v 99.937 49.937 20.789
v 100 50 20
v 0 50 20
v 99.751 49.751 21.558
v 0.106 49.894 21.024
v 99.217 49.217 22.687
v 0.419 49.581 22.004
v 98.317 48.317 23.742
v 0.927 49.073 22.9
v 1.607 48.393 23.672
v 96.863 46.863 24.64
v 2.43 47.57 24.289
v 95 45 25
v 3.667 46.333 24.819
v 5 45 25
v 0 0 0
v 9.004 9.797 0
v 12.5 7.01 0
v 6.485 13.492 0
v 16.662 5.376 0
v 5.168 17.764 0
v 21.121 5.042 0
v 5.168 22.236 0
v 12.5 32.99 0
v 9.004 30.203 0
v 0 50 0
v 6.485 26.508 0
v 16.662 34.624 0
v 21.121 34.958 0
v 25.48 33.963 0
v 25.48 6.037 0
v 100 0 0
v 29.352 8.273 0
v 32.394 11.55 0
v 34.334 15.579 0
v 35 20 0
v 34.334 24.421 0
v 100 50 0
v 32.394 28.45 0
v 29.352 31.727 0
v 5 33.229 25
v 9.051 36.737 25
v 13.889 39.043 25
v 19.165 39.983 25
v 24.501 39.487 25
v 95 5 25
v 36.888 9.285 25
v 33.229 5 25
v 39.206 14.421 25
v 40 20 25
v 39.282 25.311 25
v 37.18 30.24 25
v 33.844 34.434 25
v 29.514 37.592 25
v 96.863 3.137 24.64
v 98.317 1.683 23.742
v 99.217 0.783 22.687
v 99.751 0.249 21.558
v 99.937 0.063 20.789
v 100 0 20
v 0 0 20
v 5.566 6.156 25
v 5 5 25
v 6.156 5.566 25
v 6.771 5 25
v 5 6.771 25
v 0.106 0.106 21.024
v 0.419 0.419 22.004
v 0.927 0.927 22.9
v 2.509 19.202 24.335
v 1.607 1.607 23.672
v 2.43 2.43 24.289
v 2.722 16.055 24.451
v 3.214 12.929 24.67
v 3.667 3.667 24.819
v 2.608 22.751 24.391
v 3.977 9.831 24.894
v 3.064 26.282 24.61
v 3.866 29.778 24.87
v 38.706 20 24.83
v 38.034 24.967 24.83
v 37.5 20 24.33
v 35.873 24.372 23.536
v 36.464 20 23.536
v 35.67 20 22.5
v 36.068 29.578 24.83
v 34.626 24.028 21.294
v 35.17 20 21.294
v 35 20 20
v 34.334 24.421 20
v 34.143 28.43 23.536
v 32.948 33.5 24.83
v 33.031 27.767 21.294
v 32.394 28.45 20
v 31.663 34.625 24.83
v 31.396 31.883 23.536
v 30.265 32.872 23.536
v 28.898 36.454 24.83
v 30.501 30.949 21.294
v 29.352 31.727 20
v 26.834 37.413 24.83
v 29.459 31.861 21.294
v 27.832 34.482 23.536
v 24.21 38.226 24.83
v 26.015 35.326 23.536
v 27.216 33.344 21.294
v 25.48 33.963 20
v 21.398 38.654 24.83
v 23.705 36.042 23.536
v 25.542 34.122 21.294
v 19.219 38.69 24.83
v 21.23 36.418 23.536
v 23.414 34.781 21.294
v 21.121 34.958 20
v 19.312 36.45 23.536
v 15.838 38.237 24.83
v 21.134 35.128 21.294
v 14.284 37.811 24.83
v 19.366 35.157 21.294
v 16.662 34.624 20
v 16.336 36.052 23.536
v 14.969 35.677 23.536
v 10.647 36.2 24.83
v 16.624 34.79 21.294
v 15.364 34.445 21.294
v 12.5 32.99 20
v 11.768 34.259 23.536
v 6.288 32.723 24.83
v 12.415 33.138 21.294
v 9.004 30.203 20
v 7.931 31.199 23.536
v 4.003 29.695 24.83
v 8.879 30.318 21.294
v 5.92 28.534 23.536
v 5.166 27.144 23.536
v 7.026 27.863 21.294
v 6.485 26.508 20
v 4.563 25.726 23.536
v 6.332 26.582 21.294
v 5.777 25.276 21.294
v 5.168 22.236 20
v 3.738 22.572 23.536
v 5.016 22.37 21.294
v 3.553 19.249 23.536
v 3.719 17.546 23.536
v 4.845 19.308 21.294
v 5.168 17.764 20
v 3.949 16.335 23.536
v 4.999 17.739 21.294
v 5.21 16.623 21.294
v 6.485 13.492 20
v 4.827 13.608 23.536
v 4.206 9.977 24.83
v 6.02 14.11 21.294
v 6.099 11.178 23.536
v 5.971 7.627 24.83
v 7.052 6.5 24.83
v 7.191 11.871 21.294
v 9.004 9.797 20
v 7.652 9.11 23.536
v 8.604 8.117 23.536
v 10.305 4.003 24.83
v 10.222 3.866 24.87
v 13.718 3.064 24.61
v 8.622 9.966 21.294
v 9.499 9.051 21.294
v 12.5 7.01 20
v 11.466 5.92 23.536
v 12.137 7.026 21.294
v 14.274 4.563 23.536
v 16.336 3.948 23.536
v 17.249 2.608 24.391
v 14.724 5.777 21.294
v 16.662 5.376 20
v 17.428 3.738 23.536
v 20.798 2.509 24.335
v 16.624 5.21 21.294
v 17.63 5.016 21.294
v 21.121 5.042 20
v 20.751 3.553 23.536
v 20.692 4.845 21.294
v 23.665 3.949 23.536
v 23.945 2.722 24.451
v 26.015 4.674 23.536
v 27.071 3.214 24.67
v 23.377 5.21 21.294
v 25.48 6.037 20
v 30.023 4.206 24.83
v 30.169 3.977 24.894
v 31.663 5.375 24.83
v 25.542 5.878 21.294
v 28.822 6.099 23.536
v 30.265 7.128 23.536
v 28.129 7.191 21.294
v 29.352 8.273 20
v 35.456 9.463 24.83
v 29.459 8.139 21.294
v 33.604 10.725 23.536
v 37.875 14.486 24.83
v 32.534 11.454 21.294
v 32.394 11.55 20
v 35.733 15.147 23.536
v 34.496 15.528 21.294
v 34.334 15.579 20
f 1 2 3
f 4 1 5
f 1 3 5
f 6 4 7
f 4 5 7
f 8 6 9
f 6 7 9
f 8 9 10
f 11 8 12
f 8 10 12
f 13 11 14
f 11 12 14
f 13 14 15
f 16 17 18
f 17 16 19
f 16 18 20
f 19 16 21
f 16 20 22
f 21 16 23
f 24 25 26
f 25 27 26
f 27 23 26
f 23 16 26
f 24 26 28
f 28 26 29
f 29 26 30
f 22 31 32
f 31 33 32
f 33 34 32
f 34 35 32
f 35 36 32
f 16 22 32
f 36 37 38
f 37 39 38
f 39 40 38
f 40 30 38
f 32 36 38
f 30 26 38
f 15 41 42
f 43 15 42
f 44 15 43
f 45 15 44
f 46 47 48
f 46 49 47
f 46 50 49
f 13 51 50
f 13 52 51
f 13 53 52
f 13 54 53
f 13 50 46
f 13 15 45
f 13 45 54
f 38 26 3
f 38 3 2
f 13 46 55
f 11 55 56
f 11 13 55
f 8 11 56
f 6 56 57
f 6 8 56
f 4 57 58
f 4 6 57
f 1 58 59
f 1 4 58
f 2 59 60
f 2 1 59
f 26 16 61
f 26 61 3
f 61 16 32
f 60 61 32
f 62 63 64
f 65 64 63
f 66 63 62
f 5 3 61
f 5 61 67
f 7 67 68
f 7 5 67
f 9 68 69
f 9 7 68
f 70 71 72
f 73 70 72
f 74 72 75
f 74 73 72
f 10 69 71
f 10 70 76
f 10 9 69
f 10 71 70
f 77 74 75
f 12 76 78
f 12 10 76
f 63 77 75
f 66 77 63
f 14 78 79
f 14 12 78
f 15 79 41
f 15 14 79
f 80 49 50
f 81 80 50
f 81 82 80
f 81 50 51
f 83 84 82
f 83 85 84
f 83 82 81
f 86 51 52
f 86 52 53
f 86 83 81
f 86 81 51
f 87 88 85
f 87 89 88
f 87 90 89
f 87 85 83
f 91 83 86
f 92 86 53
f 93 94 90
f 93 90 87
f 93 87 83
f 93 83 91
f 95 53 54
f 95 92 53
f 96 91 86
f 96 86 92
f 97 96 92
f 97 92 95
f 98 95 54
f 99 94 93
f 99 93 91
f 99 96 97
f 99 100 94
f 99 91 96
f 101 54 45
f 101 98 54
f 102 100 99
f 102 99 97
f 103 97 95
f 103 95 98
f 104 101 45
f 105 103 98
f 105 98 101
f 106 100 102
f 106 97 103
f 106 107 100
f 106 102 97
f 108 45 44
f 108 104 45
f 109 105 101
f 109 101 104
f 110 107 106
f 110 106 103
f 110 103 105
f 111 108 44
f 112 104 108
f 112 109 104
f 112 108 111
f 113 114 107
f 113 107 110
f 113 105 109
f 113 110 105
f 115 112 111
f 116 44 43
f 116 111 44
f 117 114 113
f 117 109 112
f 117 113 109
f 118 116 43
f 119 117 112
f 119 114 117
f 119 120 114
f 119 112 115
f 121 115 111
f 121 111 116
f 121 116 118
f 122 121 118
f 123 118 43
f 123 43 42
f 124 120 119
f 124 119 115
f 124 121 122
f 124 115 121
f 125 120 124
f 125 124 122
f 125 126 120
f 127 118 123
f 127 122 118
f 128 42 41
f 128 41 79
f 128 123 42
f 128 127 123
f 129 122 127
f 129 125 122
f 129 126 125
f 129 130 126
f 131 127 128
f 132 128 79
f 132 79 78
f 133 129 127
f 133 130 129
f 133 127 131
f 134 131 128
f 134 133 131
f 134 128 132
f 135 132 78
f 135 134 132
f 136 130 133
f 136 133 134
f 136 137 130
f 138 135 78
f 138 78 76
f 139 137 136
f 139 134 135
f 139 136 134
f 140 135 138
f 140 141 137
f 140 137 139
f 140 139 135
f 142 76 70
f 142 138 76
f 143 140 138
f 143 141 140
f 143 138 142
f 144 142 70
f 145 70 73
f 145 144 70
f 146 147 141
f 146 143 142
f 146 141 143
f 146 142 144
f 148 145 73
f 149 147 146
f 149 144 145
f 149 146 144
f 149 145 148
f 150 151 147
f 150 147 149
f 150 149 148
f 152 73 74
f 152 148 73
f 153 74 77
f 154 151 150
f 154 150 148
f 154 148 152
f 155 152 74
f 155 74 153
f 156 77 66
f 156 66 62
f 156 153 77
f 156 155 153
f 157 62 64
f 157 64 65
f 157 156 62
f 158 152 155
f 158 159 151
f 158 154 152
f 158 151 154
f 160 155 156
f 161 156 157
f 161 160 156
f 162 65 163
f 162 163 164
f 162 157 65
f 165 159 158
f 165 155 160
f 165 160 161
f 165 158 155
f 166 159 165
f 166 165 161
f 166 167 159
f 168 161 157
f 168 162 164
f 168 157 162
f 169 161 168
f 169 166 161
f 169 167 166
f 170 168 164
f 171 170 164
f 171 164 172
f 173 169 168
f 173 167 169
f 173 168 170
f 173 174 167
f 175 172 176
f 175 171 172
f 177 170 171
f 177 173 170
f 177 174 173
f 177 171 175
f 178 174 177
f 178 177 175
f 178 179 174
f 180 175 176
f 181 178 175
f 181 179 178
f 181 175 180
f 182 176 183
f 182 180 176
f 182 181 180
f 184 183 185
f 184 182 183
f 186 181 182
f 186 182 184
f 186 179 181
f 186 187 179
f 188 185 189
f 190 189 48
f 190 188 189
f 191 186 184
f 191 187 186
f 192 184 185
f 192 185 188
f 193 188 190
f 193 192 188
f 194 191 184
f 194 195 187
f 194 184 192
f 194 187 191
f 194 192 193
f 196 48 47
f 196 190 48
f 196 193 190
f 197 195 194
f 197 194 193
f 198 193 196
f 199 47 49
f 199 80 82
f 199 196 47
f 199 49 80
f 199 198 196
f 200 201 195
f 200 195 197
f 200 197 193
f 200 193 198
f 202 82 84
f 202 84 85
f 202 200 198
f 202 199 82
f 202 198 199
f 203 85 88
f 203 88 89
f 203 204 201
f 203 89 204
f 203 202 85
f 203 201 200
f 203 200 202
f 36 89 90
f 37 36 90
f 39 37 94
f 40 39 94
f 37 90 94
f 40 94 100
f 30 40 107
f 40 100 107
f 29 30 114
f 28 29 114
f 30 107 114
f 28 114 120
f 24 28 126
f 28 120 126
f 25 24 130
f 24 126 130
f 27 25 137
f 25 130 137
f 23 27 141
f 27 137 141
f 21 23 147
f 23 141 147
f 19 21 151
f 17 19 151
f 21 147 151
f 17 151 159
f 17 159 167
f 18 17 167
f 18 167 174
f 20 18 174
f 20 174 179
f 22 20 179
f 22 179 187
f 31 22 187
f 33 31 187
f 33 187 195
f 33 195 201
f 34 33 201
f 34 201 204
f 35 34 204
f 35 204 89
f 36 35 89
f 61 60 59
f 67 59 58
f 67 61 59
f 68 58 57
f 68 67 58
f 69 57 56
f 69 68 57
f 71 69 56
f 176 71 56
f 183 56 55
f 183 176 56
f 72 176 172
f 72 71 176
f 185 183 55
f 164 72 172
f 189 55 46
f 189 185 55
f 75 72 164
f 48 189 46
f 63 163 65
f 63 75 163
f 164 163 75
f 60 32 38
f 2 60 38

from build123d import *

# Parameters (mm, degrees)
F0_W        = 100
F0_H        = 50
F1_DEPTH    = 25
F2_R        = 15
F3_DEPTH    = 25.001
F4_T1_DEPTH = 75
F4_T3_DEPTH = 125


# Not quite as in the source:
# - a fillet or chamfer that OpenCascade refuses, or shapes differently, is made with other operations: its cross-section is extruded or revolved along the edge and cut away or added


with BuildPart() as f1:
    # F0 (on Top) → F1 (new body)
    with BuildSketch(Plane.XY):
        with Locations((50, 25)):
            Rectangle(F0_W, F0_H)
    extrude(amount=F1_DEPTH)

    # F2 (on face) → F3 (cut, through all)
    with BuildSketch(Plane.XY.offset(25)):
        with Locations((20, 20)):
            Circle(F2_R)
    extrude(amount=-F3_DEPTH, mode=Mode.SUBTRACT)

    # F4: fillet of radius 5 on 5 edges, made by hand

    # F4_s2 → F4_t1 (cut)
    with BuildSketch(Plane.XZ.offset(-62.5)):
        with BuildLine():
            ThreePointArc((0, 20), (1.4644660941, 23.5355339059), (5, 25))
            Line((5, 25), (0, 25))
            Line((0, 25), (0, 20))
        make_face()
        with BuildLine():
            ThreePointArc((95, 25), (98.5355339059, 23.5355339059), (100, 20))
            Line((100, 20), (100, 25))
            Line((100, 25), (95, 25))
        make_face()
    extrude(amount=F4_T1_DEPTH, mode=Mode.SUBTRACT)

    # F4_s4 → F4_t3 (cut)
    with BuildSketch(Plane.YZ.offset(-12.5)):
        with BuildLine():
            ThreePointArc((50, 20), (48.5355339059, 23.5355339059), (45, 25))
            Line((45, 25), (50, 25))
            Line((50, 25), (50, 20))
        make_face()
        with BuildLine():
            ThreePointArc((0, 20), (1.4644660941, 23.5355339059), (5, 25))
            Line((5, 25), (0, 25))
            Line((0, 25), (0, 20))
        make_face()
    extrude(amount=F4_T3_DEPTH, mode=Mode.SUBTRACT)

    # F4_s5 → F4_t6 (revolve, cut)
    with BuildSketch(Plane.XZ.offset(-20)):
        with BuildLine():
            ThreePointArc((40, 25), (36.4644660941, 23.5355339059), (35, 20))
            Line((35, 20), (35, 25))
            Line((35, 25), (40, 25))
        make_face()
    revolve(axis=Axis((20, 20, 25), (0, 0, 1)), mode=Mode.SUBTRACT)


solid = f1.part
